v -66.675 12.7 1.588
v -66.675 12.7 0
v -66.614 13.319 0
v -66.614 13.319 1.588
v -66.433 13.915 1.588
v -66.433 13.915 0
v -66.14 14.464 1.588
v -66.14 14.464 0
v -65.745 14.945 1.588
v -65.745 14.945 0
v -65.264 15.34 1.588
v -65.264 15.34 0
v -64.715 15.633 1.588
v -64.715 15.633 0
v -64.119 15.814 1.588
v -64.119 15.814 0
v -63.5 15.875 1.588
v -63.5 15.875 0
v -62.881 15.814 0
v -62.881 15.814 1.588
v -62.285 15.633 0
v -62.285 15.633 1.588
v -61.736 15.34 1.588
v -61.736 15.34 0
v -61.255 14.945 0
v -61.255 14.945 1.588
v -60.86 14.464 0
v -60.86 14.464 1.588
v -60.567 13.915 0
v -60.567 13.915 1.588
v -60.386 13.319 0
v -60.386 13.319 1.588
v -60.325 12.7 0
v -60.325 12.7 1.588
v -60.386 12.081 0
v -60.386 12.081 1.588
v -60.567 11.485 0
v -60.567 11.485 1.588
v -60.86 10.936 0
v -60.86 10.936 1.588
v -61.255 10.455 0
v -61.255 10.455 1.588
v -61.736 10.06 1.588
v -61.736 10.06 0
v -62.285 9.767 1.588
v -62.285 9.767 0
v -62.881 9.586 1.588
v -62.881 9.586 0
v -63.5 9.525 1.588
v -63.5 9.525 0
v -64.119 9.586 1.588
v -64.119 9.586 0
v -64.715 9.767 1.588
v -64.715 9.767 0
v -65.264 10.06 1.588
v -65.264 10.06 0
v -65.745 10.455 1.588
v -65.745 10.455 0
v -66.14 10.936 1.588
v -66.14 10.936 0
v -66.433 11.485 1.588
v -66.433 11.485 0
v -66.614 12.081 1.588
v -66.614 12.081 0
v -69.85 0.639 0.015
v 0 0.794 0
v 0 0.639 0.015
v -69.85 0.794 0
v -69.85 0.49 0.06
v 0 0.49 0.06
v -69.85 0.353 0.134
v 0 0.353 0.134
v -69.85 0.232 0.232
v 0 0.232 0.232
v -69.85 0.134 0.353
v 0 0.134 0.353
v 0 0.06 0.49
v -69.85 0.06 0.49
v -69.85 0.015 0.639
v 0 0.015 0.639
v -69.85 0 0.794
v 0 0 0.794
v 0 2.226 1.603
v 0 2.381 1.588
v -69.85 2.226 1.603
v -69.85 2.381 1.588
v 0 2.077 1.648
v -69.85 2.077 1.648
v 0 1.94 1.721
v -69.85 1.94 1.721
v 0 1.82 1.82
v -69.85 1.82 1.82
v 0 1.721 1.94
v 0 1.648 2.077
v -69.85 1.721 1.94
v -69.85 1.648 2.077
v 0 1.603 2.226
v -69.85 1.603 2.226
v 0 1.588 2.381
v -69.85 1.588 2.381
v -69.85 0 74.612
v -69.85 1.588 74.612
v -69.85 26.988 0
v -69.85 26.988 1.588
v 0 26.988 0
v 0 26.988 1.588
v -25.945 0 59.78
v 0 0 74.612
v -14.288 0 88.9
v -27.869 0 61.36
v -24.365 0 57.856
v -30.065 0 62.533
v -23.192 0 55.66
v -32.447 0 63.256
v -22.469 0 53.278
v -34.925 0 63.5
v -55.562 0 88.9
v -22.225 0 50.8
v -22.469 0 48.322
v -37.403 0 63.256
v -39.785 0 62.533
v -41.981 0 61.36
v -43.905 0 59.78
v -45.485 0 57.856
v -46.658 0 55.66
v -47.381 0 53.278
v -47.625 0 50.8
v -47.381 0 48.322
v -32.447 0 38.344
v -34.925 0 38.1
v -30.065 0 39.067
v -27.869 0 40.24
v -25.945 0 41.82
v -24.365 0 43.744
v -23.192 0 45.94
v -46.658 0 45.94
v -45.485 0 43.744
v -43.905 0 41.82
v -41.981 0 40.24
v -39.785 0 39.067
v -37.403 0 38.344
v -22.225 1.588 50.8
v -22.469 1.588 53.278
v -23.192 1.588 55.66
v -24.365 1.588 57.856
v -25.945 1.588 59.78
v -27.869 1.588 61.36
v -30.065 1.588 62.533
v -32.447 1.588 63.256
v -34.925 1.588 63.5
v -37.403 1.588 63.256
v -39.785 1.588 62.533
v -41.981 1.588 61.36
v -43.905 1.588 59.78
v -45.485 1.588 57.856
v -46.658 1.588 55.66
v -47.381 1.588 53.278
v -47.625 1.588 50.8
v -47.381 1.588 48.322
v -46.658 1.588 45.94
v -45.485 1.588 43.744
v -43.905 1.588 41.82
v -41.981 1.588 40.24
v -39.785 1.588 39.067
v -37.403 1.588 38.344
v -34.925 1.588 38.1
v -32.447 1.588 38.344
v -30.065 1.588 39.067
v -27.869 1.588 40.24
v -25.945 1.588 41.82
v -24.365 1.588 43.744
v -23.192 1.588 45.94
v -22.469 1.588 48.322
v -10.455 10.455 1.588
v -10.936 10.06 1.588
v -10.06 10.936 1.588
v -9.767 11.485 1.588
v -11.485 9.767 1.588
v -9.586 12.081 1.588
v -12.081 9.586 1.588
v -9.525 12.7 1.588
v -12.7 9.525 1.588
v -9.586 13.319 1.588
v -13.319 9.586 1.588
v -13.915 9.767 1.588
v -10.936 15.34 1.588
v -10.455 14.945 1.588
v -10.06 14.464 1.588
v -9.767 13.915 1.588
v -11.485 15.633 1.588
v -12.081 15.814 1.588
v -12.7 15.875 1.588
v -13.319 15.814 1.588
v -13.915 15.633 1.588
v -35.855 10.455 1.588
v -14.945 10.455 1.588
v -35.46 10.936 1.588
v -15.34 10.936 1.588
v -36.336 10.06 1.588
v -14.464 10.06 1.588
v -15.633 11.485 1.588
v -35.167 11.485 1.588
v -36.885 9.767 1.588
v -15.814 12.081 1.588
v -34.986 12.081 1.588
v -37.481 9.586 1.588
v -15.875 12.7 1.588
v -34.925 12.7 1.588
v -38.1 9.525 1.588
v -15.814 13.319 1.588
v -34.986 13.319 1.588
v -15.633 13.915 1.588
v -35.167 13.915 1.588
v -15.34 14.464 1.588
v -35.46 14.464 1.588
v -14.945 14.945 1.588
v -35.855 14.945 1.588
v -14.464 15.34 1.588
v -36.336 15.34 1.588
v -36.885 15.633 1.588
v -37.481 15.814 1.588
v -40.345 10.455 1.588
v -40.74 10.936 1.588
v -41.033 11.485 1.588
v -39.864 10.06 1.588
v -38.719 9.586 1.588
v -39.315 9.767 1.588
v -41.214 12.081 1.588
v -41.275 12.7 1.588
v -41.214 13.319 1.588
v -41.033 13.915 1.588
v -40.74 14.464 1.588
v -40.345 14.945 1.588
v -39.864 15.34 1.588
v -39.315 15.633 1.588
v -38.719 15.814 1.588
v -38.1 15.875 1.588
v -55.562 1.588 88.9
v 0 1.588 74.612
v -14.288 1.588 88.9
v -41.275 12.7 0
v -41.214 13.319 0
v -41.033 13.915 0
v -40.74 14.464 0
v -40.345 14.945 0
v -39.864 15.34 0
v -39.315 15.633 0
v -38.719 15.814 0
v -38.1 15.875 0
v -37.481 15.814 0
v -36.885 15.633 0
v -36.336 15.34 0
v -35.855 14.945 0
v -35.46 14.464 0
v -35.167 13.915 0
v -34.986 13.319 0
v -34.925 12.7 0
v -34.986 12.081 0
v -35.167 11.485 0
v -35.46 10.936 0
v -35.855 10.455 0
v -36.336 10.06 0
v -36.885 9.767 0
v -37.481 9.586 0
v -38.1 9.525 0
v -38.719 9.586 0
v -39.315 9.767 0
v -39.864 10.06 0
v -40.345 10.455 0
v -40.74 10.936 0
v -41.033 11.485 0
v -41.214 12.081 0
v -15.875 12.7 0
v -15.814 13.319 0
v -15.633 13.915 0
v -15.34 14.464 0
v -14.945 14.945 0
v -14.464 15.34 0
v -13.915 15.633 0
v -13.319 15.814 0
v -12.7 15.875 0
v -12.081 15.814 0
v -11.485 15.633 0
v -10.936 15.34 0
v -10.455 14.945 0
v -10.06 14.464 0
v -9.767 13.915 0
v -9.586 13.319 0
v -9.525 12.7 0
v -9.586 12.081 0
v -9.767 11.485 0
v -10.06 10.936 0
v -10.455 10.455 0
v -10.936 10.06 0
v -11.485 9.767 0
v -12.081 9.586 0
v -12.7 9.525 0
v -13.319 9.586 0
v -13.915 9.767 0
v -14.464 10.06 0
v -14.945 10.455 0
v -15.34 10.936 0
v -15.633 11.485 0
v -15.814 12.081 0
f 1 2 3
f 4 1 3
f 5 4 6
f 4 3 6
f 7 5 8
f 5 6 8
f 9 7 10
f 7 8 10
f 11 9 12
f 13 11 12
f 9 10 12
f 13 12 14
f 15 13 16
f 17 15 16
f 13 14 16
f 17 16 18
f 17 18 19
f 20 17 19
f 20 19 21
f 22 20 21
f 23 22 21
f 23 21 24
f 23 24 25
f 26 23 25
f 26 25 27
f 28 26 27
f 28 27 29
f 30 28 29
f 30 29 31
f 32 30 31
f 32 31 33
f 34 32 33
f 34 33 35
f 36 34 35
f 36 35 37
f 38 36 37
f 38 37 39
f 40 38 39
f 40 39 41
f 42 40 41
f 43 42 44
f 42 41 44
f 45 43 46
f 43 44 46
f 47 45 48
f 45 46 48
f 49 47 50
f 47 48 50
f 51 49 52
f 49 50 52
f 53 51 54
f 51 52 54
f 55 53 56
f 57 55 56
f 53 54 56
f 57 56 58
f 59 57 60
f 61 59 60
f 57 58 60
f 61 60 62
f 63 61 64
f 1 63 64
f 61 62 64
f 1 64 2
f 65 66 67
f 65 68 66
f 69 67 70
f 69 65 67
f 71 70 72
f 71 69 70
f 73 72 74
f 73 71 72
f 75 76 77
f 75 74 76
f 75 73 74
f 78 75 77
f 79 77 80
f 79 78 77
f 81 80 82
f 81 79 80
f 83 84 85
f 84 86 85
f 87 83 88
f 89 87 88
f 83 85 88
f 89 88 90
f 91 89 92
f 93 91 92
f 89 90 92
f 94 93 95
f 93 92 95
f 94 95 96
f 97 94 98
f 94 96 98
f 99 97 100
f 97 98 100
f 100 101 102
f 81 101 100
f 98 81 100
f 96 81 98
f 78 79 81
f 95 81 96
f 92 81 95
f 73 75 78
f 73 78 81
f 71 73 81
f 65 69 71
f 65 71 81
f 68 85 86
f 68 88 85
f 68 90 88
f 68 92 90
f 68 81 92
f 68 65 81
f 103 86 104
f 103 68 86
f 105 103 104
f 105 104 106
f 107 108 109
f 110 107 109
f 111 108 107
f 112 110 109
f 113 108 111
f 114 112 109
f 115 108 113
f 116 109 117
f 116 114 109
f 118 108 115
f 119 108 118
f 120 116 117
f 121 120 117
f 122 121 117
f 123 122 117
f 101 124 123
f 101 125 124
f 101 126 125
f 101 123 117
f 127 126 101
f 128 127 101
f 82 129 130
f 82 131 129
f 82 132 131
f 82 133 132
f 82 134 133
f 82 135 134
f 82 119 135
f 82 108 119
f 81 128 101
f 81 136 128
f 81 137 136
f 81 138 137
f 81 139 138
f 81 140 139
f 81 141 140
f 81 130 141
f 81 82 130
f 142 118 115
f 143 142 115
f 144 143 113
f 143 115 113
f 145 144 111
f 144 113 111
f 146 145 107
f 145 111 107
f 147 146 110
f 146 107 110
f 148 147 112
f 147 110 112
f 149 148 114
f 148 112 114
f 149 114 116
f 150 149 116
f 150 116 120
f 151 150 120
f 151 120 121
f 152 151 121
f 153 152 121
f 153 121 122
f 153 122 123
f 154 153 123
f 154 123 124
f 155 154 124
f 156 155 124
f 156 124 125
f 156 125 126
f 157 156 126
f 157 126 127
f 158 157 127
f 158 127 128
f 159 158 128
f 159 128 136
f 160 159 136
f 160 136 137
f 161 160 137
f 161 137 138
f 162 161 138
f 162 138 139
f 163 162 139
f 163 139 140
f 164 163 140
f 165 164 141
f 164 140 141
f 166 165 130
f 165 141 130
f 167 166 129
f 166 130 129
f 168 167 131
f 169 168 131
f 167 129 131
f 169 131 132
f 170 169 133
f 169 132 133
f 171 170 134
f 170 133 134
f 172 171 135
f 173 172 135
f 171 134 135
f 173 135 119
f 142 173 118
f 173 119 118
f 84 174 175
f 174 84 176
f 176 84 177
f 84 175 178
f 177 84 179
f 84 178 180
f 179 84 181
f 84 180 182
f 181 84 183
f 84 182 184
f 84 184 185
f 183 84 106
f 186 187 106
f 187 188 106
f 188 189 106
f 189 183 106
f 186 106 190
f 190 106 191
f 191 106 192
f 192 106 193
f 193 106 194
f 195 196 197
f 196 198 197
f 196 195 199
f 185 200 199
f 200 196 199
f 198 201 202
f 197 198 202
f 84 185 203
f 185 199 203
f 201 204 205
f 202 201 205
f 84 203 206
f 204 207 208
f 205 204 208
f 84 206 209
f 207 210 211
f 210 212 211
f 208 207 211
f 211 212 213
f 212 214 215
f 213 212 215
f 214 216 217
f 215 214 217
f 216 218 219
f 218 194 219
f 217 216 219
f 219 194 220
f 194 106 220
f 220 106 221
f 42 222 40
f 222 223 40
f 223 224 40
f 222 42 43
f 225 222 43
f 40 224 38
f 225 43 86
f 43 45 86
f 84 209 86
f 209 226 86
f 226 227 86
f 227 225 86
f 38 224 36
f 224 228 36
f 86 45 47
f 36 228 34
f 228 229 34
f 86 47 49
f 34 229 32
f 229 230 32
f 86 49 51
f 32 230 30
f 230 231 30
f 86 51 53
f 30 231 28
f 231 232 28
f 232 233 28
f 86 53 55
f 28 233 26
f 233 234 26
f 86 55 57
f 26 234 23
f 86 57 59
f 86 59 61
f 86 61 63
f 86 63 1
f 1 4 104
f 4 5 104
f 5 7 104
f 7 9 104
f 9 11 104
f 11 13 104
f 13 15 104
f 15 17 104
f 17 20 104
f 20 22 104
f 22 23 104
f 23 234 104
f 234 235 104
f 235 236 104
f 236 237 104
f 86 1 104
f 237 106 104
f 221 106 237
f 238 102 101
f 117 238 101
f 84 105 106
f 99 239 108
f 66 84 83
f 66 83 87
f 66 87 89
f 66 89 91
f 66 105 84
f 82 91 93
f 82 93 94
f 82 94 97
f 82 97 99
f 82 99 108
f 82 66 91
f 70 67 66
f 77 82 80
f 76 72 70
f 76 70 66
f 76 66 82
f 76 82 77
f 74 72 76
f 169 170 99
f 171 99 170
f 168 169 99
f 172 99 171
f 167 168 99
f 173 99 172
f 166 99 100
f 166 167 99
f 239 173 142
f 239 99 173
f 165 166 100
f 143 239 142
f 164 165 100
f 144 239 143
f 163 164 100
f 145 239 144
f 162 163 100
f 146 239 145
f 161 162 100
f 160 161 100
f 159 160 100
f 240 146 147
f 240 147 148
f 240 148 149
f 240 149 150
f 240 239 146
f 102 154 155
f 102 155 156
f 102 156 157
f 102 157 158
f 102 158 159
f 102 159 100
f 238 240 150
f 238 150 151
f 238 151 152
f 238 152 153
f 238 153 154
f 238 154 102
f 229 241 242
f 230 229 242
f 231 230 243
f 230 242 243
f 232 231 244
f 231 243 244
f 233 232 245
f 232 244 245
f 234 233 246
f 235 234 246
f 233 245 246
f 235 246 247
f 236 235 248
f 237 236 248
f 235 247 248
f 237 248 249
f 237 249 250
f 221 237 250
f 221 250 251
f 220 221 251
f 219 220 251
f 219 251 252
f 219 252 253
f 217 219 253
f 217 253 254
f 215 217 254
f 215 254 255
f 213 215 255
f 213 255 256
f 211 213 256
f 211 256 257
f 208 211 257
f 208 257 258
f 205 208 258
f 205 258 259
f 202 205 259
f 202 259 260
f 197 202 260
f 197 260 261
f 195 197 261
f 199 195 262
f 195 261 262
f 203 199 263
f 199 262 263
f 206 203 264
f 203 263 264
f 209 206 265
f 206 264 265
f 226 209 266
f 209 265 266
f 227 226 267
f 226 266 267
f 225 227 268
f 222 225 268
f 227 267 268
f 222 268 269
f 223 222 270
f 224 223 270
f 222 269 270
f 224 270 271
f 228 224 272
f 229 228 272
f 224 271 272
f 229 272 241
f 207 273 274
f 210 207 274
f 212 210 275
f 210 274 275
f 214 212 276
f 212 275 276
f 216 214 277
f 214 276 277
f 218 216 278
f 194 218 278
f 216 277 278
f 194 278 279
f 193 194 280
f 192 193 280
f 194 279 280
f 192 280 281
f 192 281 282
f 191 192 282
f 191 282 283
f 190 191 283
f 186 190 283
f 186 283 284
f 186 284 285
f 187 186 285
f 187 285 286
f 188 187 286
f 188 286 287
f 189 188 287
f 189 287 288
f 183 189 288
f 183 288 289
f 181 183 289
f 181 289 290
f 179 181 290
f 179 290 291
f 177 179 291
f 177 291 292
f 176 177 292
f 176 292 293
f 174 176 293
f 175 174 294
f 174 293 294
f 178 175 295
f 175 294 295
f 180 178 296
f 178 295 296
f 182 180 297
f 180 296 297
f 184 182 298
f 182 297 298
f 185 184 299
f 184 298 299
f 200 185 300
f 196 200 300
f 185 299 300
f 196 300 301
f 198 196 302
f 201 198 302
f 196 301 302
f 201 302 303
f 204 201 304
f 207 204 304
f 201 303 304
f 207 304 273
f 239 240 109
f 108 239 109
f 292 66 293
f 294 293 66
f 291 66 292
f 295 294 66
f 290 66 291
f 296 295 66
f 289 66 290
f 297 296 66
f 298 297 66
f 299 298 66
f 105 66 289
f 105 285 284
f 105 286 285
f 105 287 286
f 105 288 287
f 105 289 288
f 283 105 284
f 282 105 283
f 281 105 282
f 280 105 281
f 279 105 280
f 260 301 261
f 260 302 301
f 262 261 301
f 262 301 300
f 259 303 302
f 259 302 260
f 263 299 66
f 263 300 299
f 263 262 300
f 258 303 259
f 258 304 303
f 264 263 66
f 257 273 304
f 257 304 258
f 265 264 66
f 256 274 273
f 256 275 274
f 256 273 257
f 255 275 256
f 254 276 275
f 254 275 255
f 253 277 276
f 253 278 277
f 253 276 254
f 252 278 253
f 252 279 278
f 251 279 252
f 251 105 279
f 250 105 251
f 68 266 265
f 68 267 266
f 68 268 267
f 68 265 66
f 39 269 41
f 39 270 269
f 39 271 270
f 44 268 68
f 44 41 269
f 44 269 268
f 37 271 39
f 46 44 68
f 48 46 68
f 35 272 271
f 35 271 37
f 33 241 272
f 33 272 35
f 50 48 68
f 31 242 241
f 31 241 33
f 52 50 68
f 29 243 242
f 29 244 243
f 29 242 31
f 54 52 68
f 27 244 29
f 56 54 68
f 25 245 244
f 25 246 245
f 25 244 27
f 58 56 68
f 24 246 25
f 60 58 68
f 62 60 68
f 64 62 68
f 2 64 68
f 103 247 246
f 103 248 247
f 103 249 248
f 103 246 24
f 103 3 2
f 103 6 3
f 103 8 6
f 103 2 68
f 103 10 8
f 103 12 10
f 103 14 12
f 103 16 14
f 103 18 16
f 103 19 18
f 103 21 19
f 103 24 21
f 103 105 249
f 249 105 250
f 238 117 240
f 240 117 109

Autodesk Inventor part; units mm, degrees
ref_plane "YZ Plane" through (0, 0, 0) normal (1, 0, 0) x (0, 1, 0)
ref_plane "XZ Plane" through (0, 0, 0) normal (0, 1, 0) x (-1, 0, 0)
ref_plane "XY Plane" through (0, 0, 0) normal (0, 0, 1) x (1, 0, 0)
sketch "Sketch1" plane through (0, 0, 0) normal (0, 1, 0) x (-1, 0, 0)
  line L0 (69.85, 88.9) -> (0, 88.9)
  line L1 (0, 88.9) -> (0, 0)
  line L2 (0, 0) -> (69.85, 0)
  line L3 (69.85, 0) -> (69.85, 88.9)
extrude "Extrusion1" add sketch "Sketch1" along normal blind 1.5875
chamfer "Chamfer1" distance 14.2875 angle 45 1 edges at (-69.85, 0.7937, 88.9)
chamfer "Chamfer2" distance 14.2875 angle 45 1 edges at (0, 0.7937, 88.9)
sketch "Sketch2" plane through (0, 0, 0) normal (0, 0, -1) x (-1, 0, 0)
  line L0 (69.85, 26.9875) -> (0, 26.9875)
  line L1 (0, 26.9875) -> (0, 0)
  line L2 (0, 0) -> (69.85, 0)
  line L3 (69.85, 0) -> (69.85, 26.9875)
sketch "Sketch3" plane through (0, 0, 0) normal (1, 0, 0) x (0, 0, -1)
  line L0 (0, 0) -> (-1.5875, 0)
  line L1 (-1.5875, 0) -> (-1.5875, 1.5875)
  line L2 (-1.5875, 1.5875) -> (0, 1.5875)
  line L3 (0, 1.5875) -> (0, 0)
  dimension "d8" = 1.5875
  dimension "d9" = 1.5875
extrude "Extrusion2" cut sketch "Sketch3" against normal blind 69.85
extrude "Extrusion3" add sketch "Sketch2" against normal blind 1.5875
fillet "Fillet1" radius 0.7937 1 edges at (-34.925, 1.5875, 1.5875)
fillet "Fillet2" radius 0.7937 1 edges at (-34.925, 0, 0)
sketch "Sketch4" plane through (0, 0, 0) normal (0, 0, -1) x (-1, 0, 0)
  circle A0 centre (12.7, 12.7) radius 3.175
  point P0 (0, 0)
  dimension "d16" = 6.35
extrude "Extrusion4" cut sketch "Sketch4" against normal blind 1.5875
sketch "Sketch5" plane through (0, 0, 0) normal (0, 0, -1) x (-1, 0, 0)
  circle A0 centre (63.5, 12.7) radius 3.175
  point P0 (0, 0)
  dimension "d19" = 6.35
extrude "Extrusion5" cut sketch "Sketch5" against normal blind 1.5875
sketch "Sketch6" plane through (0, 0, 0) normal (0, 0, -1) x (-1, 0, 0)
  circle A0 centre (38.1, 12.7) radius 3.175
  point P0 (0, 0)
  dimension "d22" = 6.35
extrude "Extrusion6" cut sketch "Sketch6" against normal blind 1.5875
sketch "Sketch7" plane through (0, 0, 0) normal (0, -1, 0) x (1, 0, 0)
  circle A0 centre (-34.925, 50.8) radius 12.7
  point P0 (0, 0)
  dimension "d25" = 25.4
extrude "Extrusion7" cut sketch "Sketch7" against normal blind 1.5875
properties part number "alignmentWheelsBarP2"
